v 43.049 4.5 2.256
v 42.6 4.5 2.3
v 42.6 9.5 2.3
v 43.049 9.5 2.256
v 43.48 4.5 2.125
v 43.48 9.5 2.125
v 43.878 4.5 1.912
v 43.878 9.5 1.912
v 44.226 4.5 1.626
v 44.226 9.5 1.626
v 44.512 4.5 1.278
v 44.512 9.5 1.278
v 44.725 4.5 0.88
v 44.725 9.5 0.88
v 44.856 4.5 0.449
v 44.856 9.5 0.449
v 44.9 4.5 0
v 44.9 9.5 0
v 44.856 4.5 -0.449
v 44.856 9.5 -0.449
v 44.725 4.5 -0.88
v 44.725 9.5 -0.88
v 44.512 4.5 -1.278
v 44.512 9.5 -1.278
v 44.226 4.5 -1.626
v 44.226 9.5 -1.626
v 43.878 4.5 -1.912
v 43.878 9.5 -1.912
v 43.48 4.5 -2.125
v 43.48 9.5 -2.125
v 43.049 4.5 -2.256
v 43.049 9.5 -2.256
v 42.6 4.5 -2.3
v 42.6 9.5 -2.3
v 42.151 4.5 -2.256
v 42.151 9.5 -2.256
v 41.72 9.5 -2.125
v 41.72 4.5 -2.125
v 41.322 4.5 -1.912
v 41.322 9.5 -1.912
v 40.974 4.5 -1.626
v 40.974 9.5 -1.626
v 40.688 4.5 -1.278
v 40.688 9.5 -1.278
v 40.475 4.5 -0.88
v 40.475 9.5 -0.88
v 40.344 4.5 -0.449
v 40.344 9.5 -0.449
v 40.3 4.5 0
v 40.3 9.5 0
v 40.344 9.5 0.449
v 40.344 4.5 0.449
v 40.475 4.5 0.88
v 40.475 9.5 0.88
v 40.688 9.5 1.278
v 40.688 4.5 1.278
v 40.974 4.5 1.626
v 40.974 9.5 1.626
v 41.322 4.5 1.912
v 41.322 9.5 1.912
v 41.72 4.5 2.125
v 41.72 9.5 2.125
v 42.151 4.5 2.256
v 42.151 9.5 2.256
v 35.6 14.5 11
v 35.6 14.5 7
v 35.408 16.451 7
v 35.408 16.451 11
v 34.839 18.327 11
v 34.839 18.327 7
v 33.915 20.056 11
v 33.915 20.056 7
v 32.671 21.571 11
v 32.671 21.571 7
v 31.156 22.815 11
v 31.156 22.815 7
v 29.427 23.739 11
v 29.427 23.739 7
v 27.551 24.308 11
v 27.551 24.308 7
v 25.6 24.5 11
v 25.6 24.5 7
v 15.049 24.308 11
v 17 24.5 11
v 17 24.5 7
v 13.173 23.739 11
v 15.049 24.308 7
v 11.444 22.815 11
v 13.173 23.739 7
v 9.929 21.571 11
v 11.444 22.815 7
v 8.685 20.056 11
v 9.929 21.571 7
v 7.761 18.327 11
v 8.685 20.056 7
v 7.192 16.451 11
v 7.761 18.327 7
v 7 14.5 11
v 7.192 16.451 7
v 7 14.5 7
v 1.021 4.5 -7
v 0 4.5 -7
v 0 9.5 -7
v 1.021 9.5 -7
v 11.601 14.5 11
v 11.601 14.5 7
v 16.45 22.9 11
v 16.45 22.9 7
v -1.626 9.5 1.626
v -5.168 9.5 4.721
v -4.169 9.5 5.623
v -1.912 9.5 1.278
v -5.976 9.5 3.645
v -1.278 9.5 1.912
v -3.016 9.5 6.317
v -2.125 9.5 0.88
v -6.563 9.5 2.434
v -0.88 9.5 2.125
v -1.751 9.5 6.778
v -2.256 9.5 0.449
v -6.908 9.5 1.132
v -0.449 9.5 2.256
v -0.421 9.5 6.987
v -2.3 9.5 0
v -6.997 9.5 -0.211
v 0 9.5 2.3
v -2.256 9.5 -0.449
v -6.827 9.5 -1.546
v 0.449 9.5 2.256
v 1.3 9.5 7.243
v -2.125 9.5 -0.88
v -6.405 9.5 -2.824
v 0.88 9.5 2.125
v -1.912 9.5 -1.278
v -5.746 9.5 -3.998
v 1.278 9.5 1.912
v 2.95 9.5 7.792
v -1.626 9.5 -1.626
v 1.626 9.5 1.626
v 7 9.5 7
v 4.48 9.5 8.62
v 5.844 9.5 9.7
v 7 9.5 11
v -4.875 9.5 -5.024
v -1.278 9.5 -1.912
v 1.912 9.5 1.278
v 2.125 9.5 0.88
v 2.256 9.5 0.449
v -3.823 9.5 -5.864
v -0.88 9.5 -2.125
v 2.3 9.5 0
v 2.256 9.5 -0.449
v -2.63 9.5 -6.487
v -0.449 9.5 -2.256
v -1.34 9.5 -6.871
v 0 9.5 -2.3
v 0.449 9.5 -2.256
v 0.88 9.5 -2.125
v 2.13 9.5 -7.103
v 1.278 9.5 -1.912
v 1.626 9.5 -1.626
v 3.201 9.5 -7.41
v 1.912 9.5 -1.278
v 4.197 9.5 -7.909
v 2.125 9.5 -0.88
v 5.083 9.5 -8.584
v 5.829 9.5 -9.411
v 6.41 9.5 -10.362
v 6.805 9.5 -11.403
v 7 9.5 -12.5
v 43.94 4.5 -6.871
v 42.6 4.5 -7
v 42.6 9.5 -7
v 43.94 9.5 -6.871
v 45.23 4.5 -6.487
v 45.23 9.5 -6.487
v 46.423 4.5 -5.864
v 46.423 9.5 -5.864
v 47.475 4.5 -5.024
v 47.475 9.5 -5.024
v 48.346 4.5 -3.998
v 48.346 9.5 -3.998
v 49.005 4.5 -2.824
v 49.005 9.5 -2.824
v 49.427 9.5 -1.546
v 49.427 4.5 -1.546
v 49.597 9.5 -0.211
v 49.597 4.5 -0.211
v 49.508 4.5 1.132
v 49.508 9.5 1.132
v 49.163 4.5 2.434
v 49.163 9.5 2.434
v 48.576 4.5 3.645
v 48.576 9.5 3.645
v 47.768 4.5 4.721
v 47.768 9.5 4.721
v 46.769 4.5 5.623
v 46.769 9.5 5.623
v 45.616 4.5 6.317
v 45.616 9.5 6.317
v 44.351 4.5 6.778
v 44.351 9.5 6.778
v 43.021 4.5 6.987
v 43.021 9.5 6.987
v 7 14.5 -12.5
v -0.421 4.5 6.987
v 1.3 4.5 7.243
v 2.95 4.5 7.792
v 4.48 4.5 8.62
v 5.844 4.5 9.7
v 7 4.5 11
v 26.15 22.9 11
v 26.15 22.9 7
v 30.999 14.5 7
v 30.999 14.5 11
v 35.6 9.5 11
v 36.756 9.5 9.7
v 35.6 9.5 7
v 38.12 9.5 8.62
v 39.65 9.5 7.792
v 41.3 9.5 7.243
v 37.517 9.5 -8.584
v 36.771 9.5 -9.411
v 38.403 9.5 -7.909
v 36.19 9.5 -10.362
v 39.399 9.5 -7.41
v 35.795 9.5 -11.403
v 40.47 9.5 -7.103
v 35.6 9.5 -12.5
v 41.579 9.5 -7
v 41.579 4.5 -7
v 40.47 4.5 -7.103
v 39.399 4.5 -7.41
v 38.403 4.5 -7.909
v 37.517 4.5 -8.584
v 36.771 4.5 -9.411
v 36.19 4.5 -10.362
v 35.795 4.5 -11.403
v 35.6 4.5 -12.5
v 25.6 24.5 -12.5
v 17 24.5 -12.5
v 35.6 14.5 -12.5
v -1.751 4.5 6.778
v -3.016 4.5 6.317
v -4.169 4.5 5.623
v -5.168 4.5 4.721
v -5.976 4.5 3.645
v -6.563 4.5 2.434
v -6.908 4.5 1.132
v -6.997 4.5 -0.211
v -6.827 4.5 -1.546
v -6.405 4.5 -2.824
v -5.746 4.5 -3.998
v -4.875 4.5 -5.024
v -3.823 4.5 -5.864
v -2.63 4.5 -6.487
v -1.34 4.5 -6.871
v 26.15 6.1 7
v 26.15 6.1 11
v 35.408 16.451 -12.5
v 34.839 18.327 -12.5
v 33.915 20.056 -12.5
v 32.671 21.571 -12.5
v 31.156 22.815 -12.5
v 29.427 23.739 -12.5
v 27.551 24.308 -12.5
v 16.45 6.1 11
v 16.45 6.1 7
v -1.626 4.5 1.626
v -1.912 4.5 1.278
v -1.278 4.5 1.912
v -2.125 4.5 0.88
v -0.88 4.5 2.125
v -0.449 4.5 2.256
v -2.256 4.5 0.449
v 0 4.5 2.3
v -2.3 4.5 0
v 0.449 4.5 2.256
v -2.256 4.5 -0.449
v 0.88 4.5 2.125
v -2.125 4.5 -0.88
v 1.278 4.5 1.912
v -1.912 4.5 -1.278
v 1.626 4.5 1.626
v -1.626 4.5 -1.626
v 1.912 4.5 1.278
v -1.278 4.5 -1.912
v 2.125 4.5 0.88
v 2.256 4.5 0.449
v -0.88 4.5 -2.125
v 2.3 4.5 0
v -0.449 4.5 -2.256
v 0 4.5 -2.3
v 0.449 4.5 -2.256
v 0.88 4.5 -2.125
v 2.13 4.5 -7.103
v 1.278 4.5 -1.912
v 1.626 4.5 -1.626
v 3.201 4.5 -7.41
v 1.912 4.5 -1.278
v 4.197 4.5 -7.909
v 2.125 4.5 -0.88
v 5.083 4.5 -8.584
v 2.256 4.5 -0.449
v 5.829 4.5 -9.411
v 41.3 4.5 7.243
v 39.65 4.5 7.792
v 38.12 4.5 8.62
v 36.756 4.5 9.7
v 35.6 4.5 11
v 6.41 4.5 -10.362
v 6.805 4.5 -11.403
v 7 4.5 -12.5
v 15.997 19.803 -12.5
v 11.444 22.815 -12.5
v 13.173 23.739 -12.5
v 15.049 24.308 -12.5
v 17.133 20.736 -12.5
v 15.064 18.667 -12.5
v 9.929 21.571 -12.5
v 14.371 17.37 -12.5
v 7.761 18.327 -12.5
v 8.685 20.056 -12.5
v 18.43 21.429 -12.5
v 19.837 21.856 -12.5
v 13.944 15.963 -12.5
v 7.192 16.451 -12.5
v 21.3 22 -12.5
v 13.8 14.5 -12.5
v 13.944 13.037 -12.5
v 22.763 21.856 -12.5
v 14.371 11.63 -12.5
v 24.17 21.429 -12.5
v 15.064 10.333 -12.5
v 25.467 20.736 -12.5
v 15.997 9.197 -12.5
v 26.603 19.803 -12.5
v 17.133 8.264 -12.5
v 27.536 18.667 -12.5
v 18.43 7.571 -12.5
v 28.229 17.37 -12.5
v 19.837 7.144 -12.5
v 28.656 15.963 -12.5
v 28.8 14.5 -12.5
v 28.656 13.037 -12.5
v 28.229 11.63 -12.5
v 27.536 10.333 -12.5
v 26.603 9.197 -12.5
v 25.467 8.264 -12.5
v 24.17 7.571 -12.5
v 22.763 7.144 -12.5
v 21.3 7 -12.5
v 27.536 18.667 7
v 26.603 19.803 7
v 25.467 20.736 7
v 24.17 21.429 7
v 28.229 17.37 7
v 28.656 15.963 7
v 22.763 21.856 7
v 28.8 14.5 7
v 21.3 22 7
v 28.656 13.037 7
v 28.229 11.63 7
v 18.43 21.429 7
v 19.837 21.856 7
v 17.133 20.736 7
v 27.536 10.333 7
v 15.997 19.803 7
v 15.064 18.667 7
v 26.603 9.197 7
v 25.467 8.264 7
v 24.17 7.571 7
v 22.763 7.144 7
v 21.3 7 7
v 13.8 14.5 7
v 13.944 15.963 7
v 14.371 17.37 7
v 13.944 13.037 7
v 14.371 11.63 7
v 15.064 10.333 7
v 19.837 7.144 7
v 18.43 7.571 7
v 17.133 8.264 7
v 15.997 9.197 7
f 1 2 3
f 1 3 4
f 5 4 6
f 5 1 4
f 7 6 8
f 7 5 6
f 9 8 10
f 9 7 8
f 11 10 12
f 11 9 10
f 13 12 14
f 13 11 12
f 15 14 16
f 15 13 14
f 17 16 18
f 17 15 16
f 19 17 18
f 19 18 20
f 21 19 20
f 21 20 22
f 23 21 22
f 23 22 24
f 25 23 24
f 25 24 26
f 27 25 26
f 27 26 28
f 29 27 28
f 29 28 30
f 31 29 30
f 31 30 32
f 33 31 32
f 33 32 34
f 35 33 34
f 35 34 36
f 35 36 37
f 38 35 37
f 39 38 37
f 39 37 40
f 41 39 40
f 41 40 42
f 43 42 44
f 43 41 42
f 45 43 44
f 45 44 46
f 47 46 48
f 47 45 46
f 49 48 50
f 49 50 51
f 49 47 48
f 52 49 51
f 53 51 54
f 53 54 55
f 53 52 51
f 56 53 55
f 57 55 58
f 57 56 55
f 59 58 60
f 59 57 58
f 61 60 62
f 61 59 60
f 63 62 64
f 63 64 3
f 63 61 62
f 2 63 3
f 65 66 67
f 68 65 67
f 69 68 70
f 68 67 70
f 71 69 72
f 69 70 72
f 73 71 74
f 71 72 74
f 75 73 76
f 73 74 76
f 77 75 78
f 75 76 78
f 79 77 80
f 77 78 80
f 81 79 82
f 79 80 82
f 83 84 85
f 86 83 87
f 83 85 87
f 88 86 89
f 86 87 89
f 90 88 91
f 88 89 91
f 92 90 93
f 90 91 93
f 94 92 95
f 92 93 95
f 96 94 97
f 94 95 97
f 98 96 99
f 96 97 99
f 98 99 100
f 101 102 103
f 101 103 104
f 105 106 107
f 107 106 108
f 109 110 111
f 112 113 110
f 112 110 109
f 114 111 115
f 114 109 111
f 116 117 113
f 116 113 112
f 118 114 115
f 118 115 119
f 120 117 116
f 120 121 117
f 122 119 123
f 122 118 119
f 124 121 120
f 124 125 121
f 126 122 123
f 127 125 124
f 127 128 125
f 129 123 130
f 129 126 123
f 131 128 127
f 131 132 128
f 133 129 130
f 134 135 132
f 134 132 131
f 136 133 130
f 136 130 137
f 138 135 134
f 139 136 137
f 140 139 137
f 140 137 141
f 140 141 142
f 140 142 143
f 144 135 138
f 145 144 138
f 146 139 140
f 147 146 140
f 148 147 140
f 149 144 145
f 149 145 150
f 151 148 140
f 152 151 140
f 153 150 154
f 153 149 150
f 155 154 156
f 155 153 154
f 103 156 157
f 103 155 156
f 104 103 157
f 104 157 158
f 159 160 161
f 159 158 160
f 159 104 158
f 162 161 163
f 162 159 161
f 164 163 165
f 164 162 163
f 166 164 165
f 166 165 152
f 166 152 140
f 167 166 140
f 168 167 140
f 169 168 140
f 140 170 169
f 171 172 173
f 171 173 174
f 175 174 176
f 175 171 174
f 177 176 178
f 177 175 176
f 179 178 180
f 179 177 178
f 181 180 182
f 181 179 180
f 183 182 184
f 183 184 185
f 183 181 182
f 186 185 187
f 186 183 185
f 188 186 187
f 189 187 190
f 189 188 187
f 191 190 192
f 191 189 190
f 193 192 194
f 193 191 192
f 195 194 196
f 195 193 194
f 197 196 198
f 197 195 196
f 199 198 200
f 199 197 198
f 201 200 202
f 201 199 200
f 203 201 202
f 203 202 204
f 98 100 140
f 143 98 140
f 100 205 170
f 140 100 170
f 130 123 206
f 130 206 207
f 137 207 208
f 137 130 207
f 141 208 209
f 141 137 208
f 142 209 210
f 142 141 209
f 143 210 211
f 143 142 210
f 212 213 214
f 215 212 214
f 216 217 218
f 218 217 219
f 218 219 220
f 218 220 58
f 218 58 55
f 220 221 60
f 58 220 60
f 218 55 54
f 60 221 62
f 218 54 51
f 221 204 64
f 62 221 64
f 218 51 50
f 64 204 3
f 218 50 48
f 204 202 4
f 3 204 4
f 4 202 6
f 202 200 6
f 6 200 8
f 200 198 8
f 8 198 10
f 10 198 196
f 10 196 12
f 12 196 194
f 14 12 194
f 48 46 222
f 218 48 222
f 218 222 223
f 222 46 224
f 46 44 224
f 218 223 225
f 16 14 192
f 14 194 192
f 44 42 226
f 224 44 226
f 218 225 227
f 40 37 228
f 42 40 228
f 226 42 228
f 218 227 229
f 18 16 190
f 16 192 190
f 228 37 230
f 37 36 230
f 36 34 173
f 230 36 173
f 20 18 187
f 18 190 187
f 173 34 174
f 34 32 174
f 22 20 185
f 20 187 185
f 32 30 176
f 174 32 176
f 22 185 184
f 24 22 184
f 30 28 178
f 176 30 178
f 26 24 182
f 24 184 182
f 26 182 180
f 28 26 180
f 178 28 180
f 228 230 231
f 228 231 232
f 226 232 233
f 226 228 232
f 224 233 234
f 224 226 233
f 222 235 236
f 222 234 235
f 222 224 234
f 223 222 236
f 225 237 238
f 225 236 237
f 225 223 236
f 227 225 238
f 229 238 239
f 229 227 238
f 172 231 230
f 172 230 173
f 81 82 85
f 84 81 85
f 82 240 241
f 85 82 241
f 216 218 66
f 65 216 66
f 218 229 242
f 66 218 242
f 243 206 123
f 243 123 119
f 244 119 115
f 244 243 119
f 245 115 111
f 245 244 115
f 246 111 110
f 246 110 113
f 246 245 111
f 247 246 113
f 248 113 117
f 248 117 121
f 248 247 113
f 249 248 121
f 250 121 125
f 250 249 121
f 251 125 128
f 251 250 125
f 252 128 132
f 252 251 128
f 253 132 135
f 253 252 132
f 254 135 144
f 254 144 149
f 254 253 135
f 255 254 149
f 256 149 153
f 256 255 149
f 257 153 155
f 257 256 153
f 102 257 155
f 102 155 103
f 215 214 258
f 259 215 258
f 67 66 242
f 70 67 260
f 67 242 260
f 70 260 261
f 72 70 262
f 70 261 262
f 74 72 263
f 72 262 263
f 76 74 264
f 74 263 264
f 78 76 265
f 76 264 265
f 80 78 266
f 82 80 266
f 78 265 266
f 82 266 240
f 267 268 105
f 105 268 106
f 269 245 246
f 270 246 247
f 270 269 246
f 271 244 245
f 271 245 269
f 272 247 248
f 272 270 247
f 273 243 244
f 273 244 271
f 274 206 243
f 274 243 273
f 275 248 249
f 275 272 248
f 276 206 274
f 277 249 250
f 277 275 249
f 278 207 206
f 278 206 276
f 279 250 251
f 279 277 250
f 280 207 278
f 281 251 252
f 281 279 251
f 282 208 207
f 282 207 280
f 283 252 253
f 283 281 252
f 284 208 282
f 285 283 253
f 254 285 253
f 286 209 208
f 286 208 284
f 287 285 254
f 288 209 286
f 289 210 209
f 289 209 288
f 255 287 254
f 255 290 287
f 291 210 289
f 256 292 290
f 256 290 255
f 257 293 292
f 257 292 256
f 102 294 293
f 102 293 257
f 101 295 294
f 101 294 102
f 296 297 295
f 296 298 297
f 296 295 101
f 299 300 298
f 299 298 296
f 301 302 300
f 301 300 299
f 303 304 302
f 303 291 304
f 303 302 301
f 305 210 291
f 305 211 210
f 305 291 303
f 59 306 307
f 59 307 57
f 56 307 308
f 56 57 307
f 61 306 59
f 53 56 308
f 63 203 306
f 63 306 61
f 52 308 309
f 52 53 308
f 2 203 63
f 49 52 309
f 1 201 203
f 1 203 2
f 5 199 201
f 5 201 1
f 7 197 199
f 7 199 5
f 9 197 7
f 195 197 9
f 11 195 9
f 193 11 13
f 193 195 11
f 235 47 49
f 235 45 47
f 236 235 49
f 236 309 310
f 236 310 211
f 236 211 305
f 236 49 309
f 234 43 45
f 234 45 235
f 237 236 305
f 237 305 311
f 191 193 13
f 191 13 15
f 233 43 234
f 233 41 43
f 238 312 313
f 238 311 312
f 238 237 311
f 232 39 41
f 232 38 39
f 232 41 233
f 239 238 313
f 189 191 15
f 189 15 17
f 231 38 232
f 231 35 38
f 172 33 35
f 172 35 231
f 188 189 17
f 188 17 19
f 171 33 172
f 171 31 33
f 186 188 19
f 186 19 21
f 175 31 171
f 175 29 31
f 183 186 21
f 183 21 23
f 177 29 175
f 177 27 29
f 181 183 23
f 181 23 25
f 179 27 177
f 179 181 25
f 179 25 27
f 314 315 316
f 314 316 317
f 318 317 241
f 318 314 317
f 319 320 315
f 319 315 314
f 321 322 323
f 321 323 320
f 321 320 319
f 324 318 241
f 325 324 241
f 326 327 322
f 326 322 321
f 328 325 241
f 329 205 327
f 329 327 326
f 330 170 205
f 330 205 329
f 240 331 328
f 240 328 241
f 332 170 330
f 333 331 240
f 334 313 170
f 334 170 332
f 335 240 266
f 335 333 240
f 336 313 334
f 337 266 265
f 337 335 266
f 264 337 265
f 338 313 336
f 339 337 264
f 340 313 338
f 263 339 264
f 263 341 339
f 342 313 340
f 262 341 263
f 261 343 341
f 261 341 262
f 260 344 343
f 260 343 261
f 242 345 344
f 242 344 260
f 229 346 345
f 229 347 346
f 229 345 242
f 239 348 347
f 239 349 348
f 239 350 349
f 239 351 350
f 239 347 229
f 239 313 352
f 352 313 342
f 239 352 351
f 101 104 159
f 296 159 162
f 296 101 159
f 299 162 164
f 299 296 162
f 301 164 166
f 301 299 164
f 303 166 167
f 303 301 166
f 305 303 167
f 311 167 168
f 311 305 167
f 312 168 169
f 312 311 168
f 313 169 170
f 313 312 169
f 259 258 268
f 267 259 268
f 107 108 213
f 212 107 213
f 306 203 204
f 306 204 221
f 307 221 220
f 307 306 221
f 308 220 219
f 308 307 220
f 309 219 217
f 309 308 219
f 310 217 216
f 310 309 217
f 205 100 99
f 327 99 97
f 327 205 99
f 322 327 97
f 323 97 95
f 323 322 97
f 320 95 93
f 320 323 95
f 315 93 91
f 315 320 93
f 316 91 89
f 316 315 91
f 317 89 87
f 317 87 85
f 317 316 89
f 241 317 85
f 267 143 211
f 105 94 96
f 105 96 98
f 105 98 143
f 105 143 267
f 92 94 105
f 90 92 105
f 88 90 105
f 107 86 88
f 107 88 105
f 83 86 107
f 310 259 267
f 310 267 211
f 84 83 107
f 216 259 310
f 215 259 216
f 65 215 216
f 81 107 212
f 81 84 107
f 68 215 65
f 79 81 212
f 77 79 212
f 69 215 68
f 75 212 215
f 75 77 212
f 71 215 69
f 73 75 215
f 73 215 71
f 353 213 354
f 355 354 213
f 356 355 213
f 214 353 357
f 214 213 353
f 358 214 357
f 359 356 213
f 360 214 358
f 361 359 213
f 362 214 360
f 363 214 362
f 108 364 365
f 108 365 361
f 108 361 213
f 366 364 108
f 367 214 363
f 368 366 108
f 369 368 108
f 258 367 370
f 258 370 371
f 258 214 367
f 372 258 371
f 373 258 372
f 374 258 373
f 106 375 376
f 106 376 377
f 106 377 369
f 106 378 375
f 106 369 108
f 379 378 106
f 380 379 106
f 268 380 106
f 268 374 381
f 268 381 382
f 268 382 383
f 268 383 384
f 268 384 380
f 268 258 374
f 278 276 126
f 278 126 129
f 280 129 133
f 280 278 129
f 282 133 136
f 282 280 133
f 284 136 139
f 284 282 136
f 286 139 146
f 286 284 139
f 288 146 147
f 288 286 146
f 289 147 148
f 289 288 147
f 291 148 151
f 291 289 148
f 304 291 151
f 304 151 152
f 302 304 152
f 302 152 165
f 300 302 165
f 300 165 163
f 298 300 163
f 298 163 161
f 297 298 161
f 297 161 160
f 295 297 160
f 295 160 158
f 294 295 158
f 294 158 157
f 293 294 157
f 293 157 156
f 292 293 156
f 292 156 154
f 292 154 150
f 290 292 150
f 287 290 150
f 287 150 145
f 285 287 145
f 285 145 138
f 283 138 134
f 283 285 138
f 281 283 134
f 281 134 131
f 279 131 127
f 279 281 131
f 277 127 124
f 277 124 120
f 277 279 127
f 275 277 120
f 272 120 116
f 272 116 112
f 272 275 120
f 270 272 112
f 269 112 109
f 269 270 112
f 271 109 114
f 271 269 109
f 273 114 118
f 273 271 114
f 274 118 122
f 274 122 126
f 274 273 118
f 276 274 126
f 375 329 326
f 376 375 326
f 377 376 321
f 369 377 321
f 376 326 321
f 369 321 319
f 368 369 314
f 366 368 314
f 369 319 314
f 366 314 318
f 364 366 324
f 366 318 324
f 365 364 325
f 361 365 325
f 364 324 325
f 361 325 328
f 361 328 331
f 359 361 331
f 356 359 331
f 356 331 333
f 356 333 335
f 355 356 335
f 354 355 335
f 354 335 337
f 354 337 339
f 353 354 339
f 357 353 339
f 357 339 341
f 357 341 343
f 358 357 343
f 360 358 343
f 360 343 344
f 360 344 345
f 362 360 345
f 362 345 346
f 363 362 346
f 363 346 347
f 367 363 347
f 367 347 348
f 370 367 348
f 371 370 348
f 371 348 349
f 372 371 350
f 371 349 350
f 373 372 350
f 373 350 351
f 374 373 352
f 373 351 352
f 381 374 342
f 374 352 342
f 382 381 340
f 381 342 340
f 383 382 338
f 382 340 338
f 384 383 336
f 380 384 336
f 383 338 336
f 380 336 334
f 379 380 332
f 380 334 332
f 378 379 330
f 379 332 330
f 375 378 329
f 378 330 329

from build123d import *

# Parameters (mm, degrees)
SKETCH1_R                = 2.3
BOSS_EXTRUDE1_DEPTH      = 9.5
BOSS_EXTRUDE2_DEPTH      = 15
BOSS_EXTRUDE2_DEPTH_BACK = 9.5
SKETCH2_W                = 28.6
SKETCH2_H                = 19.5
SKETCH3_R                = 7.5
CUT_EXTRUDE1_DEPTH       = 59.657139378
FILLET1_R                = 10
FILLET2_R                = 6
CUT_EXTRUDE2_REACH       = 60.657
SKETCH5_W                = 56.6
SKETCH5_H                = 4.5
BOSS_EXTRUDE3_DEPTH      = 4
FILLET3_R                = 10


with BuildPart() as part:
    # Sketch1 → Boss-Extrude1 (new body)
    with BuildSketch(Plane(origin=(0, 0, 0), x_dir=(1, 0, 0), z_dir=(0, 1, 0))):
        with BuildLine():
            Line((0, 7), (42.6, 7))
            ThreePointArc((42.6, 7), (49.6, 0), (42.6, -7))
            Line((42.6, -7), (0, -7))
            ThreePointArc((0, -7), (-7, 0), (0, 7))
        make_face()
        with Locations(Location((0, 0, 0), (0, 0, 270))):
            Circle(SKETCH1_R, mode=Mode.SUBTRACT)
        with Locations(Location((42.6, 0, 0), (0, 0, 270))):
            Circle(SKETCH1_R, mode=Mode.SUBTRACT)
    extrude(amount=BOSS_EXTRUDE1_DEPTH)

    # Sketch2 → Boss-Extrude2 (add, two sides: drawn at the far end of the back side and taken through both)
    with BuildSketch(Plane(origin=(0, 9.5, 0), x_dir=(1, 0, 0), z_dir=(0, 1, 0)).offset(-BOSS_EXTRUDE2_DEPTH_BACK)):
        with Locations((21.3, 2.75)):
            Rectangle(SKETCH2_W, SKETCH2_H)
    extrude(amount=BOSS_EXTRUDE2_DEPTH + BOSS_EXTRUDE2_DEPTH_BACK)

    # Sketch3 → Cut-Extrude1 (cut, through all)
    with BuildSketch(Plane(origin=(0, 0, -12.5), x_dir=(-1, 0, 0), z_dir=(0, 0, -1))):
        with Locations((-21.3, 14.5)):
            Circle(SKETCH3_R)
    extrude(amount=-CUT_EXTRUDE1_DEPTH, mode=Mode.SUBTRACT)

    # Fillet1
    fillet1_edges = [part.edges().sort_by_distance(p)[0] for p in [
        (7, 24.5, -2.75),
        (35.6, 24.5, -2.75),
    ]]
    fillet(fillet1_edges, radius=FILLET1_R)

    # Fillet2
    # the kernel refuses this fillet: 6 mm, written as the material it adds along each edge
    with BuildSketch(Plane(origin=(7, 0, -7), x_dir=(0, 0, -1), z_dir=(0, 1, 0)), Plane(origin=(35.6, 9.5, -7), x_dir=(0, 0, -1), z_dir=(0, -1, 0))) as fillet2_piece_1:
        with BuildLine():
            CenterArc((6, 5.979130372), FILLET2_R, 180, 85.219808153)
            Line((0, 5.979130372), (-0.12, 5.979130372))
            Line((-0.12, 5.979130372), (-0.12, 0))
            Line((-0.12, 0), (0, -0.12))
            ThreePointArc((0, -0.12), (2.75, -0.12), (5.49, -0.119582607))
            Line((5.49, -0.119582607), (5.5, 0))
        make_face()
    extrude(amount=9.5)

    # Sketch5 → Cut-Extrude2 (cut, up to next)
    with BuildSketch(Plane(origin=(0, 0, -12.5), x_dir=(-1, 0, 0), z_dir=(0, 0, -1)), mode=Mode.PRIVATE) as cut_extrude2_sk1:
        with Locations((-21.3, 2.25)):
            Rectangle(SKETCH5_W, SKETCH5_H)
    cut_extrude2_tool1 = extrude(cut_extrude2_sk1.sketch, amount=-CUT_EXTRUDE2_REACH, mode=Mode.PRIVATE) & part.part
    add(cut_extrude2_tool1.solids().sort_by_distance((21.3, 2.25, -12.5))[0], mode=Mode.SUBTRACT)

    # Sketch10 → Boss-Extrude3 (add)
    with BuildSketch(Plane(origin=(0, 0, 7), x_dir=(-1, 0, 0), z_dir=(0, 0, -1))):
        with BuildLine():
            Line((-35.6, 4.5), (-35.6, 14.5))
            ThreePointArc((-35.6, 14.5), (-32.671067812, 21.571067812), (-25.6, 24.5))
            Line((-25.6, 24.5), (-17, 24.5))
            ThreePointArc((-17, 24.5), (-9.928932188, 21.571067812), (-7, 14.5))
            Line((-7, 14.5), (-7, 4.5))
            Line((-7, 4.5), (-35.6, 4.5))
        make_face()
        Polygon((-16.450257739, 22.9), (-26.149742261, 22.9), (-30.999484522, 14.5), (-26.149742261, 6.1), (-16.450257739, 6.1), (-11.600515478, 14.5), align=None, mode=Mode.SUBTRACT)
    extrude(amount=-BOSS_EXTRUDE3_DEPTH)

    # Fillet3
    # the kernel refuses this fillet: 10 mm, written as the material it adds along each edge
    with BuildSketch(Plane(origin=(7, 9.5, 7), x_dir=(-0.9999985389310836, 0, -0.0017094255462351089), z_dir=(0, -1, 0))) as fillet3_piece_1:
        with BuildLine():
            CenterArc((8.005961044, -9.982891134), FILLET3_R, 93.352047646, 49.900448128)
            Line((-0.006837702, -3.999994156), (-0.808117577, -3.401704458))
            ThreePointArc((-0.808117577, -3.401704458), (-1.00341739, -1.998287652), (-0.999998539, 0.001709426))
            Line((-0.999998539, 0.001709426), (0.001709426, 0.999998539))
            ThreePointArc((0.001709426, 0.999998539), (7.001699198, 0.98803256), (7.362781149, 0.998289113))
            Line((7.362781149, 0.998289113), (7.421252048, 0))
        make_face()
    extrude(amount=5)
    with BuildSketch(Plane(origin=(35.6, 4.5, 7), x_dir=(0, 0, 1), z_dir=(0, 1, 0))) as fillet3_piece_2:
        with BuildLine():
            CenterArc((9.969190954, 8.023014356), FILLET3_R, 183.449990563, 49.900448128)
            Line((-0.012686078, 7.421241205), (-1.010873781, 7.36106389))
            ThreePointArc((-1.010873781, 7.36106389), (-1, 7), (-1, 0))
            Line((-1, 0), (0, -1))
            ThreePointArc((0, -1), (2, -1), (3.403080905, -0.802301436))
            Line((3.403080905, -0.802301436), (4, 0))
        make_face()
    extrude(amount=5)


solid = part.part
